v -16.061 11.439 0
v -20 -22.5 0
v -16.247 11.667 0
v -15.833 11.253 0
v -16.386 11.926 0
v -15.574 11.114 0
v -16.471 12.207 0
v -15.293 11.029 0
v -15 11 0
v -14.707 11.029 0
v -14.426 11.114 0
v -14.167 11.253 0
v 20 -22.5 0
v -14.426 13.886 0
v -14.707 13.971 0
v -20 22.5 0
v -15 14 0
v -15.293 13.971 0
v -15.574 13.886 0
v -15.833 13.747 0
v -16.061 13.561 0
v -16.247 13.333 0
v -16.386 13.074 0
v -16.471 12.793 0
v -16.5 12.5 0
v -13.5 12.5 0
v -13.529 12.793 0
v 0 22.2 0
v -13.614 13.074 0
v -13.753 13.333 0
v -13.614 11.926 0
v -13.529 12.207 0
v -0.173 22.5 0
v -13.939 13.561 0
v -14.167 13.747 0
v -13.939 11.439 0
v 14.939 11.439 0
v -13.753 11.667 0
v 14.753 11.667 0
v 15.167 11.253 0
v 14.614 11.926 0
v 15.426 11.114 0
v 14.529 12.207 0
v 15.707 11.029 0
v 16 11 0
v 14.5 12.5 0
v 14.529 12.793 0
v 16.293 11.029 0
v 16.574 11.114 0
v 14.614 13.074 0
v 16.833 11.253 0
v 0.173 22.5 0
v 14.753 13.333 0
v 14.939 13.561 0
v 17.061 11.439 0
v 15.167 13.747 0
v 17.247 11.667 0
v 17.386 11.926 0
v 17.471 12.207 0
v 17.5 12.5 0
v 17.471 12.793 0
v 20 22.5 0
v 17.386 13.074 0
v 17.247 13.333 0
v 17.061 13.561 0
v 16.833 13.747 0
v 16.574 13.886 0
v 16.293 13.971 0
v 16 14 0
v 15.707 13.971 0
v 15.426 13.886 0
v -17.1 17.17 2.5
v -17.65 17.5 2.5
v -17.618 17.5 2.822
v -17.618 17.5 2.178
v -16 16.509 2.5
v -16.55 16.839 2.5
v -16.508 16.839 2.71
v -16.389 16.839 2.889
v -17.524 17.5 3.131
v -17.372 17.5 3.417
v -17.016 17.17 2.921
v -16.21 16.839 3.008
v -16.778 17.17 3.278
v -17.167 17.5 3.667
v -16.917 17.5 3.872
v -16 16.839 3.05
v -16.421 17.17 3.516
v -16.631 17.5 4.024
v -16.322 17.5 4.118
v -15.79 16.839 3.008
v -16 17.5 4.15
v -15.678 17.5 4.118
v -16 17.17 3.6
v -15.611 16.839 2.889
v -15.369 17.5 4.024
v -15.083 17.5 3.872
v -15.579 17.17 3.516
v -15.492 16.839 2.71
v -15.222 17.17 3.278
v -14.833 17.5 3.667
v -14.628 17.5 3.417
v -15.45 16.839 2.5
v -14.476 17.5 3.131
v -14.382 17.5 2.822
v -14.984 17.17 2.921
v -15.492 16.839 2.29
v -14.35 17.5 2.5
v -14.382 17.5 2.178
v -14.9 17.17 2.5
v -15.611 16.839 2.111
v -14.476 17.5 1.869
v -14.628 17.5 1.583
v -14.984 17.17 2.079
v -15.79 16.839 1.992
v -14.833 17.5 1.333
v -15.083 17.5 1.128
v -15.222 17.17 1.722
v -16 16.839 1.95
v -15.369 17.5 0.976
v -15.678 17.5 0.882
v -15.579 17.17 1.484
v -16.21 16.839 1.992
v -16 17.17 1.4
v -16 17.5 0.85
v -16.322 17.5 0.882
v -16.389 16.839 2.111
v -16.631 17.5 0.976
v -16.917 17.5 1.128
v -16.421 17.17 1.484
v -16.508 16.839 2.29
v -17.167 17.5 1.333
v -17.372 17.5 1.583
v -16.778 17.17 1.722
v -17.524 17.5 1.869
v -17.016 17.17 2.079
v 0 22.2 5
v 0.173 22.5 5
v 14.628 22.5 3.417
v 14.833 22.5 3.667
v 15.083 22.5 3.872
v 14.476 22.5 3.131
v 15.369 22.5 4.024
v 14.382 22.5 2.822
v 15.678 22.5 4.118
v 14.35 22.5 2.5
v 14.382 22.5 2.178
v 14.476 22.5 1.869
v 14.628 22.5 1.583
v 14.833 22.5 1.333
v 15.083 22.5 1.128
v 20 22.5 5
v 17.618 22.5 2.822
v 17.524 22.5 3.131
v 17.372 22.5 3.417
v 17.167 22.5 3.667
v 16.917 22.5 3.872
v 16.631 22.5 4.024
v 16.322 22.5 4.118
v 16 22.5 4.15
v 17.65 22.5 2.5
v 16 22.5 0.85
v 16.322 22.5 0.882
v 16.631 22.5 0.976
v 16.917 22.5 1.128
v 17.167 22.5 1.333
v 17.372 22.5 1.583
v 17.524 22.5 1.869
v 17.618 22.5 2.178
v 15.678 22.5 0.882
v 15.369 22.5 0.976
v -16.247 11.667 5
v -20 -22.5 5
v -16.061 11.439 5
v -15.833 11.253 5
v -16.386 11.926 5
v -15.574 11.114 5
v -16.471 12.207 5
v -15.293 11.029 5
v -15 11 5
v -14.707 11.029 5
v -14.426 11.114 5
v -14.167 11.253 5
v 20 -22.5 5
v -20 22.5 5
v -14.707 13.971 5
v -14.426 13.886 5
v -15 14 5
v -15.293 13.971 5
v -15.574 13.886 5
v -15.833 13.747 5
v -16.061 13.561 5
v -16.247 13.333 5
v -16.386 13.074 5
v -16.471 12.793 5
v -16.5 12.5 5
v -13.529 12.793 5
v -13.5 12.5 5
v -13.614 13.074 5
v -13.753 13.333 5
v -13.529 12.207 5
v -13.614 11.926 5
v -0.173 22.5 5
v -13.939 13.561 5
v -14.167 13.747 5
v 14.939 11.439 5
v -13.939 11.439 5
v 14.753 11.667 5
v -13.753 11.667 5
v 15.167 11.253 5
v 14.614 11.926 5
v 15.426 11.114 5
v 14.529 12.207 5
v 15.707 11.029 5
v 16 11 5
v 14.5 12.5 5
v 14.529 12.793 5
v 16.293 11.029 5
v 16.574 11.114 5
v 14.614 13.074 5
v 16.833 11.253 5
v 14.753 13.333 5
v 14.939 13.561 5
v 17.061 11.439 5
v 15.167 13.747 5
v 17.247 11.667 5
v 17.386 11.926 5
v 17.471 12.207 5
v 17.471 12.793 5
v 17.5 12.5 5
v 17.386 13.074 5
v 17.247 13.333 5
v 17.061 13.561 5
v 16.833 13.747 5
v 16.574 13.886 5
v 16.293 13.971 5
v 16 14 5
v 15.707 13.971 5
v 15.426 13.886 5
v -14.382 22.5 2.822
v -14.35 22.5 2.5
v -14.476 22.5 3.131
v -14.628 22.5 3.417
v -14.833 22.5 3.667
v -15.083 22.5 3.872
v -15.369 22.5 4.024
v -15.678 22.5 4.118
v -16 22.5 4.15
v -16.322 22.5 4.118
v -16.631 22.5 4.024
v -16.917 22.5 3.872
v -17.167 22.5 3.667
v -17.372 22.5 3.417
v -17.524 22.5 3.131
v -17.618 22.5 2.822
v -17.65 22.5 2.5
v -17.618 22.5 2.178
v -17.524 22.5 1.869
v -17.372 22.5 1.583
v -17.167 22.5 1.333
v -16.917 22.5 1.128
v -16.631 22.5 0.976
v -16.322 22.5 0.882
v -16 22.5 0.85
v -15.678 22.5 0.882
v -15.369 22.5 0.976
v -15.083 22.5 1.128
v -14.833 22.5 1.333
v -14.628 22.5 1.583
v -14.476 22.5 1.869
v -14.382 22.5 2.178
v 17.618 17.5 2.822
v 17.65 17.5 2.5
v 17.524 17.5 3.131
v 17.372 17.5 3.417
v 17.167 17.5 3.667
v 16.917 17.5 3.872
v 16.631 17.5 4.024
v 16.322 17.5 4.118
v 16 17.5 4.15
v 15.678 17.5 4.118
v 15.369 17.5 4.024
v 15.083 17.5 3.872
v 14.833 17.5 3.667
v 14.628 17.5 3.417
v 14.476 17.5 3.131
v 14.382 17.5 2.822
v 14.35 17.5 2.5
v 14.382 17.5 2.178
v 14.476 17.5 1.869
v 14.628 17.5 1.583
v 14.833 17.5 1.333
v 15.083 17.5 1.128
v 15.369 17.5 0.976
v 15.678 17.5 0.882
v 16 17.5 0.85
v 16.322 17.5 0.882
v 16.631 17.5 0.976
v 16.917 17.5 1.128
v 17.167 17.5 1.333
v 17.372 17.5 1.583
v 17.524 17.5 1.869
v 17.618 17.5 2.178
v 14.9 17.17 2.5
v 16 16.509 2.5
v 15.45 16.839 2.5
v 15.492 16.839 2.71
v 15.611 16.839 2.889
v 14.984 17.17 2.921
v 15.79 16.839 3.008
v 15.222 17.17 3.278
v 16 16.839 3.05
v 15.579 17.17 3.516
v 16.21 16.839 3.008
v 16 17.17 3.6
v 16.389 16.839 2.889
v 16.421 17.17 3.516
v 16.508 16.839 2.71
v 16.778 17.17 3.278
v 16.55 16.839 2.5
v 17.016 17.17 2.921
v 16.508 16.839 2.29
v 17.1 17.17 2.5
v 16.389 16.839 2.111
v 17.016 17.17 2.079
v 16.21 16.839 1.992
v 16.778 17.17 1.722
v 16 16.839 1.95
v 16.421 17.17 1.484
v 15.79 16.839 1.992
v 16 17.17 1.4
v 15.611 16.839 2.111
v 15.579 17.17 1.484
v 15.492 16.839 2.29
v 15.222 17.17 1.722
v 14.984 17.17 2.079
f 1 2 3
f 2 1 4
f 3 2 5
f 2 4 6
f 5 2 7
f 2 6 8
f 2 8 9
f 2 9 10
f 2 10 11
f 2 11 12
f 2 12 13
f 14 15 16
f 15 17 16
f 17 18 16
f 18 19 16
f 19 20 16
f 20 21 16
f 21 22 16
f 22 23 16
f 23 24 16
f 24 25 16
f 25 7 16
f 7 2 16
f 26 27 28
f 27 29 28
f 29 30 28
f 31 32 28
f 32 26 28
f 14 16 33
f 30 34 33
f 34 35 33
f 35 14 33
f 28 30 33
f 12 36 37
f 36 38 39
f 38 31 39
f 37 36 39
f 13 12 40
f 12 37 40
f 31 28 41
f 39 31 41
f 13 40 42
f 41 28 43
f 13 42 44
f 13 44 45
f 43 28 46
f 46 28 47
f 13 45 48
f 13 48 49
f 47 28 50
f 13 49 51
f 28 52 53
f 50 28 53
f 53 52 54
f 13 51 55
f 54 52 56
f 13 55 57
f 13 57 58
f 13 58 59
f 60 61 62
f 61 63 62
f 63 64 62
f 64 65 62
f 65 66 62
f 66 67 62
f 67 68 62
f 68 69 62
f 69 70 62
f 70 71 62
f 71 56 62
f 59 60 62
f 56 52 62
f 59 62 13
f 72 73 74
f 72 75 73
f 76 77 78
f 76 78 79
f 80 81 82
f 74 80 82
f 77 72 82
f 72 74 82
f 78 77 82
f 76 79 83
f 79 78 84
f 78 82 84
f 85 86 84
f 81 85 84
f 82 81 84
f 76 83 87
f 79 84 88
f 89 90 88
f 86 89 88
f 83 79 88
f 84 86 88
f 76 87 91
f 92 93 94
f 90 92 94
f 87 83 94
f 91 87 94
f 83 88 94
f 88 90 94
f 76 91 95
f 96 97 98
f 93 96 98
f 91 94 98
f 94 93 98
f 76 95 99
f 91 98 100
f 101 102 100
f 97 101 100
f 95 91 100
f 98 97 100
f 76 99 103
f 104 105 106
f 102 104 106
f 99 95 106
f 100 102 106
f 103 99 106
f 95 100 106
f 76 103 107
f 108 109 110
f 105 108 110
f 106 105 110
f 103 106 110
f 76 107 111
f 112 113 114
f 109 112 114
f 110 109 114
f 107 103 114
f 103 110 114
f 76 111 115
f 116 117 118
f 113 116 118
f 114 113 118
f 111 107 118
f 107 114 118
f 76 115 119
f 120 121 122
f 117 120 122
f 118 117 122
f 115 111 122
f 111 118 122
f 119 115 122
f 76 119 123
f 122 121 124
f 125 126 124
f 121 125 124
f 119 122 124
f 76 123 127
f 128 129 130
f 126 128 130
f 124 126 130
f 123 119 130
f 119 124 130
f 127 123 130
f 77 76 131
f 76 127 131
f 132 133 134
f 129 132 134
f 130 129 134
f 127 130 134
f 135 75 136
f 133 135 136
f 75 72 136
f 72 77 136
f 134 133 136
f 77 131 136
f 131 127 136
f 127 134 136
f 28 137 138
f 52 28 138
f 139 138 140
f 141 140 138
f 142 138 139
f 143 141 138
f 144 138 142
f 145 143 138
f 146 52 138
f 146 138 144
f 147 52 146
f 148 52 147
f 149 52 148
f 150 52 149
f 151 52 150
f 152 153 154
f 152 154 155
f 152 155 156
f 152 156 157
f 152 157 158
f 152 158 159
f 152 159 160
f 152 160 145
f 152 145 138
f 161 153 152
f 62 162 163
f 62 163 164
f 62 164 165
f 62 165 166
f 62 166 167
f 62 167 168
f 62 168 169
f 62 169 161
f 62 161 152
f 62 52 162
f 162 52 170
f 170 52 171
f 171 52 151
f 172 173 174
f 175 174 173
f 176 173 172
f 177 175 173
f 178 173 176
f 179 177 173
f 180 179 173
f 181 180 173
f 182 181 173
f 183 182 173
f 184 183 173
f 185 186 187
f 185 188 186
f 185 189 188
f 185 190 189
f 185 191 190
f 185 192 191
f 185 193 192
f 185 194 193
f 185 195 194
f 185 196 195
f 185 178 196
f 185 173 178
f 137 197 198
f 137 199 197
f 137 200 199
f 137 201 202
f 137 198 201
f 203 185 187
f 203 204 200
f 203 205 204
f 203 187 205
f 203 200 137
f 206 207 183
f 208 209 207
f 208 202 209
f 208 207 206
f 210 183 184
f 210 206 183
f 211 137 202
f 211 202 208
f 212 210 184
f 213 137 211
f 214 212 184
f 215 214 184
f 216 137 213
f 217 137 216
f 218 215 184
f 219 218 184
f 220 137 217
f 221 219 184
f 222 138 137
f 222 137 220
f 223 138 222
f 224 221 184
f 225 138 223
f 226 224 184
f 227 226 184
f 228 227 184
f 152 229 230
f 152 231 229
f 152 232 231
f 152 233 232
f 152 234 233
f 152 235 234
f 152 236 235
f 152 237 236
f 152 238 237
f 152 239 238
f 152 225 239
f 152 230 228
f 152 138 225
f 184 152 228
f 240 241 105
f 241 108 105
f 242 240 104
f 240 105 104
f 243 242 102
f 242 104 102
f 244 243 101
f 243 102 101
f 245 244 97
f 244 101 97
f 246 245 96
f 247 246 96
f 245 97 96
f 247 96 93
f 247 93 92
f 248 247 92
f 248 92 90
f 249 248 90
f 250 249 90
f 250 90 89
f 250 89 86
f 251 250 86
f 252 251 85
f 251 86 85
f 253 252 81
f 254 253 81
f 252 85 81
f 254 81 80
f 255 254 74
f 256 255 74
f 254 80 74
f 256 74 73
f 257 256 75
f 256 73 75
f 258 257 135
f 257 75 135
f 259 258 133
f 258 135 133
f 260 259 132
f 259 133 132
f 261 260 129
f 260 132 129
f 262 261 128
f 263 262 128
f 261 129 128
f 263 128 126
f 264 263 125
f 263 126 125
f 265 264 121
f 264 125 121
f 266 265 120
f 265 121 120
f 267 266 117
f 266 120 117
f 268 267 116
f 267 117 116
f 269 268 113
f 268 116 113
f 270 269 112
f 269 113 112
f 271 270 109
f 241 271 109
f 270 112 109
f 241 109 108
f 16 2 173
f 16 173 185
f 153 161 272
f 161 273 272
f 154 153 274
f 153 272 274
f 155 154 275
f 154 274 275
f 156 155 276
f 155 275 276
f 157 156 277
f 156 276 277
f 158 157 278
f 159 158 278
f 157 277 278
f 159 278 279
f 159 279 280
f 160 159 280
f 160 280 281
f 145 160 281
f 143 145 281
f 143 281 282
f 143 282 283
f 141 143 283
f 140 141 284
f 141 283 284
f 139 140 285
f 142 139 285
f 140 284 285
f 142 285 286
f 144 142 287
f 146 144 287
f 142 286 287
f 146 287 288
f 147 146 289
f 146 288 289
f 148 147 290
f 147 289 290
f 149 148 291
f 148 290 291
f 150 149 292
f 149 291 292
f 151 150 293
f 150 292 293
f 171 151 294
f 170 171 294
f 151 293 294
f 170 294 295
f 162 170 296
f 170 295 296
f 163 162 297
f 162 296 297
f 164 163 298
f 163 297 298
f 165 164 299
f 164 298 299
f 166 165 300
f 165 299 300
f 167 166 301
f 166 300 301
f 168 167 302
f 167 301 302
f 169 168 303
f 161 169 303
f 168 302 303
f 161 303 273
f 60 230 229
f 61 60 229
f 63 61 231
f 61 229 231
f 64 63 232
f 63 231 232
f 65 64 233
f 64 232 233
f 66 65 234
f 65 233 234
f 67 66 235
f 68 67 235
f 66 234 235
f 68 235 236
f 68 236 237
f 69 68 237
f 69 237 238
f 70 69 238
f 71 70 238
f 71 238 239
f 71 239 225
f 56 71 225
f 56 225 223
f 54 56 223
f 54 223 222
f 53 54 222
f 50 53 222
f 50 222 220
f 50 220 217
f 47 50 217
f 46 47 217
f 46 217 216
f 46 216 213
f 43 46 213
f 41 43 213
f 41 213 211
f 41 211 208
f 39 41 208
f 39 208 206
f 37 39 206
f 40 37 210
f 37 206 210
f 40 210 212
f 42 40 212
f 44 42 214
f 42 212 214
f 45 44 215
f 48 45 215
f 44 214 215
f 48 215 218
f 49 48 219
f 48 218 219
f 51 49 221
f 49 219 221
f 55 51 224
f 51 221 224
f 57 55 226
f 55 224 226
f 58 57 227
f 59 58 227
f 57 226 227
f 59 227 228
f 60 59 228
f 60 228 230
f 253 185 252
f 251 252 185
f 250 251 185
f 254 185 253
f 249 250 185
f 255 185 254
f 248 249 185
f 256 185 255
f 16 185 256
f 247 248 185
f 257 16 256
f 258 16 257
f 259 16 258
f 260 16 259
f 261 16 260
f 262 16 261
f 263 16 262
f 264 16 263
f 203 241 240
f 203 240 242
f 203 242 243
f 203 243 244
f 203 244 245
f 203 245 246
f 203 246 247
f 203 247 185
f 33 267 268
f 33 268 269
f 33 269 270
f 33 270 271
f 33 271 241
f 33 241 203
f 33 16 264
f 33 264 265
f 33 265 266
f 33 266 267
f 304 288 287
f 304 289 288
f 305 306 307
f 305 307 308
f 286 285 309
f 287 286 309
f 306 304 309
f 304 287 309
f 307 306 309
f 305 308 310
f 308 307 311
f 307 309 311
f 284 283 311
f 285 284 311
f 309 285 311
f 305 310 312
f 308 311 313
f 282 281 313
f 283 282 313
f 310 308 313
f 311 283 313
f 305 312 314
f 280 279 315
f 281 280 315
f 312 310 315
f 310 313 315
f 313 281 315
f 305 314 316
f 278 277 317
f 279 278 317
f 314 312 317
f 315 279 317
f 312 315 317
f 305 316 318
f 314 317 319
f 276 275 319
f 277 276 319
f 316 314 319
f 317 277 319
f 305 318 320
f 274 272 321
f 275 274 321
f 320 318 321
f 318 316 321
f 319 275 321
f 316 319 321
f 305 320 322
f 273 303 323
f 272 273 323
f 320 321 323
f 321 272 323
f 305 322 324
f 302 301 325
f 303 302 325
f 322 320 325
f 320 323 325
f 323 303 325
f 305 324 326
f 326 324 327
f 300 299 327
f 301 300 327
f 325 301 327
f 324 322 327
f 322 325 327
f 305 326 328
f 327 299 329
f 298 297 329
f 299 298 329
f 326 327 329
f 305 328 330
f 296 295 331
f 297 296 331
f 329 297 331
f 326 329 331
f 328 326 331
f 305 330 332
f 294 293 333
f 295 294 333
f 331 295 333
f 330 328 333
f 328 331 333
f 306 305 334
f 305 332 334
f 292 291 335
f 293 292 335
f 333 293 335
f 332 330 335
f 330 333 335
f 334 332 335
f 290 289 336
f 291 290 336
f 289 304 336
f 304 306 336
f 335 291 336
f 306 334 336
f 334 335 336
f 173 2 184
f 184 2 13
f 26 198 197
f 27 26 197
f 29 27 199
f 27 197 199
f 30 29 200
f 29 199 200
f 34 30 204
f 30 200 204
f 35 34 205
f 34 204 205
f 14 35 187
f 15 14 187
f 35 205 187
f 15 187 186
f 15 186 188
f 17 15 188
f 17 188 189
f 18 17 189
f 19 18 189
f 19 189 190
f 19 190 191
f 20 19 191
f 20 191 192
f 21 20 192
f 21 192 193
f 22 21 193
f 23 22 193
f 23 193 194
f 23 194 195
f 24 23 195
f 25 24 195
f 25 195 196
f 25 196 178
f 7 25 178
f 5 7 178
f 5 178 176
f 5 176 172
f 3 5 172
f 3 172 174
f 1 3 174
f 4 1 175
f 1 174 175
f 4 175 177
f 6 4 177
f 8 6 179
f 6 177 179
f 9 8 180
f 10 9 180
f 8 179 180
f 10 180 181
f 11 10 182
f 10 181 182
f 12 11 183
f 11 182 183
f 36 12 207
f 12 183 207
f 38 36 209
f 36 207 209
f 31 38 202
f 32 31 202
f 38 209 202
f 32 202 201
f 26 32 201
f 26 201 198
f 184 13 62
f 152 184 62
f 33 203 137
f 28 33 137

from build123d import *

# Parameters (mm, degrees)
F0_W     = 40
F0_H     = 45
F1_DEPTH = 5
F2_R     = 1.5
F3_DEPTH = 25
F5_DEPTH = 25
F7_D     = 3.3
F7_DEPTH = 5
F7_TIP   = 0.9914200214


with BuildPart() as f1:
    # F0 (on Top) → F1 (new body)
    with BuildSketch(Plane.XY):
        Rectangle(F0_W, F0_H)
    extrude(amount=F1_DEPTH)

    # F2 (on face) → F3 (cut)
    with BuildSketch(Plane.XY.offset(5)):
        with Locations((16, 12.5)):
            Circle(F2_R)
        with Locations((-15, 12.5)):
            Circle(F2_R)
    extrude(amount=-F3_DEPTH, mode=Mode.SUBTRACT)

    # F4 (on face) → F5 (cut)
    with BuildSketch(Plane.XY.offset(5)):
        Polygon((0.1732050808, 22.5), (-0.1732050808, 22.5), (0, 22.2), align=None)
    extrude(amount=-F5_DEPTH, mode=Mode.SUBTRACT)

    # F7
    with Locations(Plane(origin=(0, 22.5, 0), x_dir=(-1, 0, 0), z_dir=(0, 1, 0))):
        with Locations((-16, 2.5), (16, 2.5)):
            Hole(F7_D / 2, depth=F7_DEPTH)
            with Locations((0, 0, -(F7_DEPTH + F7_TIP / 2))):  # 118° drill point
                Cone(0, F7_D / 2, F7_TIP, mode=Mode.SUBTRACT)


solid = f1.part
